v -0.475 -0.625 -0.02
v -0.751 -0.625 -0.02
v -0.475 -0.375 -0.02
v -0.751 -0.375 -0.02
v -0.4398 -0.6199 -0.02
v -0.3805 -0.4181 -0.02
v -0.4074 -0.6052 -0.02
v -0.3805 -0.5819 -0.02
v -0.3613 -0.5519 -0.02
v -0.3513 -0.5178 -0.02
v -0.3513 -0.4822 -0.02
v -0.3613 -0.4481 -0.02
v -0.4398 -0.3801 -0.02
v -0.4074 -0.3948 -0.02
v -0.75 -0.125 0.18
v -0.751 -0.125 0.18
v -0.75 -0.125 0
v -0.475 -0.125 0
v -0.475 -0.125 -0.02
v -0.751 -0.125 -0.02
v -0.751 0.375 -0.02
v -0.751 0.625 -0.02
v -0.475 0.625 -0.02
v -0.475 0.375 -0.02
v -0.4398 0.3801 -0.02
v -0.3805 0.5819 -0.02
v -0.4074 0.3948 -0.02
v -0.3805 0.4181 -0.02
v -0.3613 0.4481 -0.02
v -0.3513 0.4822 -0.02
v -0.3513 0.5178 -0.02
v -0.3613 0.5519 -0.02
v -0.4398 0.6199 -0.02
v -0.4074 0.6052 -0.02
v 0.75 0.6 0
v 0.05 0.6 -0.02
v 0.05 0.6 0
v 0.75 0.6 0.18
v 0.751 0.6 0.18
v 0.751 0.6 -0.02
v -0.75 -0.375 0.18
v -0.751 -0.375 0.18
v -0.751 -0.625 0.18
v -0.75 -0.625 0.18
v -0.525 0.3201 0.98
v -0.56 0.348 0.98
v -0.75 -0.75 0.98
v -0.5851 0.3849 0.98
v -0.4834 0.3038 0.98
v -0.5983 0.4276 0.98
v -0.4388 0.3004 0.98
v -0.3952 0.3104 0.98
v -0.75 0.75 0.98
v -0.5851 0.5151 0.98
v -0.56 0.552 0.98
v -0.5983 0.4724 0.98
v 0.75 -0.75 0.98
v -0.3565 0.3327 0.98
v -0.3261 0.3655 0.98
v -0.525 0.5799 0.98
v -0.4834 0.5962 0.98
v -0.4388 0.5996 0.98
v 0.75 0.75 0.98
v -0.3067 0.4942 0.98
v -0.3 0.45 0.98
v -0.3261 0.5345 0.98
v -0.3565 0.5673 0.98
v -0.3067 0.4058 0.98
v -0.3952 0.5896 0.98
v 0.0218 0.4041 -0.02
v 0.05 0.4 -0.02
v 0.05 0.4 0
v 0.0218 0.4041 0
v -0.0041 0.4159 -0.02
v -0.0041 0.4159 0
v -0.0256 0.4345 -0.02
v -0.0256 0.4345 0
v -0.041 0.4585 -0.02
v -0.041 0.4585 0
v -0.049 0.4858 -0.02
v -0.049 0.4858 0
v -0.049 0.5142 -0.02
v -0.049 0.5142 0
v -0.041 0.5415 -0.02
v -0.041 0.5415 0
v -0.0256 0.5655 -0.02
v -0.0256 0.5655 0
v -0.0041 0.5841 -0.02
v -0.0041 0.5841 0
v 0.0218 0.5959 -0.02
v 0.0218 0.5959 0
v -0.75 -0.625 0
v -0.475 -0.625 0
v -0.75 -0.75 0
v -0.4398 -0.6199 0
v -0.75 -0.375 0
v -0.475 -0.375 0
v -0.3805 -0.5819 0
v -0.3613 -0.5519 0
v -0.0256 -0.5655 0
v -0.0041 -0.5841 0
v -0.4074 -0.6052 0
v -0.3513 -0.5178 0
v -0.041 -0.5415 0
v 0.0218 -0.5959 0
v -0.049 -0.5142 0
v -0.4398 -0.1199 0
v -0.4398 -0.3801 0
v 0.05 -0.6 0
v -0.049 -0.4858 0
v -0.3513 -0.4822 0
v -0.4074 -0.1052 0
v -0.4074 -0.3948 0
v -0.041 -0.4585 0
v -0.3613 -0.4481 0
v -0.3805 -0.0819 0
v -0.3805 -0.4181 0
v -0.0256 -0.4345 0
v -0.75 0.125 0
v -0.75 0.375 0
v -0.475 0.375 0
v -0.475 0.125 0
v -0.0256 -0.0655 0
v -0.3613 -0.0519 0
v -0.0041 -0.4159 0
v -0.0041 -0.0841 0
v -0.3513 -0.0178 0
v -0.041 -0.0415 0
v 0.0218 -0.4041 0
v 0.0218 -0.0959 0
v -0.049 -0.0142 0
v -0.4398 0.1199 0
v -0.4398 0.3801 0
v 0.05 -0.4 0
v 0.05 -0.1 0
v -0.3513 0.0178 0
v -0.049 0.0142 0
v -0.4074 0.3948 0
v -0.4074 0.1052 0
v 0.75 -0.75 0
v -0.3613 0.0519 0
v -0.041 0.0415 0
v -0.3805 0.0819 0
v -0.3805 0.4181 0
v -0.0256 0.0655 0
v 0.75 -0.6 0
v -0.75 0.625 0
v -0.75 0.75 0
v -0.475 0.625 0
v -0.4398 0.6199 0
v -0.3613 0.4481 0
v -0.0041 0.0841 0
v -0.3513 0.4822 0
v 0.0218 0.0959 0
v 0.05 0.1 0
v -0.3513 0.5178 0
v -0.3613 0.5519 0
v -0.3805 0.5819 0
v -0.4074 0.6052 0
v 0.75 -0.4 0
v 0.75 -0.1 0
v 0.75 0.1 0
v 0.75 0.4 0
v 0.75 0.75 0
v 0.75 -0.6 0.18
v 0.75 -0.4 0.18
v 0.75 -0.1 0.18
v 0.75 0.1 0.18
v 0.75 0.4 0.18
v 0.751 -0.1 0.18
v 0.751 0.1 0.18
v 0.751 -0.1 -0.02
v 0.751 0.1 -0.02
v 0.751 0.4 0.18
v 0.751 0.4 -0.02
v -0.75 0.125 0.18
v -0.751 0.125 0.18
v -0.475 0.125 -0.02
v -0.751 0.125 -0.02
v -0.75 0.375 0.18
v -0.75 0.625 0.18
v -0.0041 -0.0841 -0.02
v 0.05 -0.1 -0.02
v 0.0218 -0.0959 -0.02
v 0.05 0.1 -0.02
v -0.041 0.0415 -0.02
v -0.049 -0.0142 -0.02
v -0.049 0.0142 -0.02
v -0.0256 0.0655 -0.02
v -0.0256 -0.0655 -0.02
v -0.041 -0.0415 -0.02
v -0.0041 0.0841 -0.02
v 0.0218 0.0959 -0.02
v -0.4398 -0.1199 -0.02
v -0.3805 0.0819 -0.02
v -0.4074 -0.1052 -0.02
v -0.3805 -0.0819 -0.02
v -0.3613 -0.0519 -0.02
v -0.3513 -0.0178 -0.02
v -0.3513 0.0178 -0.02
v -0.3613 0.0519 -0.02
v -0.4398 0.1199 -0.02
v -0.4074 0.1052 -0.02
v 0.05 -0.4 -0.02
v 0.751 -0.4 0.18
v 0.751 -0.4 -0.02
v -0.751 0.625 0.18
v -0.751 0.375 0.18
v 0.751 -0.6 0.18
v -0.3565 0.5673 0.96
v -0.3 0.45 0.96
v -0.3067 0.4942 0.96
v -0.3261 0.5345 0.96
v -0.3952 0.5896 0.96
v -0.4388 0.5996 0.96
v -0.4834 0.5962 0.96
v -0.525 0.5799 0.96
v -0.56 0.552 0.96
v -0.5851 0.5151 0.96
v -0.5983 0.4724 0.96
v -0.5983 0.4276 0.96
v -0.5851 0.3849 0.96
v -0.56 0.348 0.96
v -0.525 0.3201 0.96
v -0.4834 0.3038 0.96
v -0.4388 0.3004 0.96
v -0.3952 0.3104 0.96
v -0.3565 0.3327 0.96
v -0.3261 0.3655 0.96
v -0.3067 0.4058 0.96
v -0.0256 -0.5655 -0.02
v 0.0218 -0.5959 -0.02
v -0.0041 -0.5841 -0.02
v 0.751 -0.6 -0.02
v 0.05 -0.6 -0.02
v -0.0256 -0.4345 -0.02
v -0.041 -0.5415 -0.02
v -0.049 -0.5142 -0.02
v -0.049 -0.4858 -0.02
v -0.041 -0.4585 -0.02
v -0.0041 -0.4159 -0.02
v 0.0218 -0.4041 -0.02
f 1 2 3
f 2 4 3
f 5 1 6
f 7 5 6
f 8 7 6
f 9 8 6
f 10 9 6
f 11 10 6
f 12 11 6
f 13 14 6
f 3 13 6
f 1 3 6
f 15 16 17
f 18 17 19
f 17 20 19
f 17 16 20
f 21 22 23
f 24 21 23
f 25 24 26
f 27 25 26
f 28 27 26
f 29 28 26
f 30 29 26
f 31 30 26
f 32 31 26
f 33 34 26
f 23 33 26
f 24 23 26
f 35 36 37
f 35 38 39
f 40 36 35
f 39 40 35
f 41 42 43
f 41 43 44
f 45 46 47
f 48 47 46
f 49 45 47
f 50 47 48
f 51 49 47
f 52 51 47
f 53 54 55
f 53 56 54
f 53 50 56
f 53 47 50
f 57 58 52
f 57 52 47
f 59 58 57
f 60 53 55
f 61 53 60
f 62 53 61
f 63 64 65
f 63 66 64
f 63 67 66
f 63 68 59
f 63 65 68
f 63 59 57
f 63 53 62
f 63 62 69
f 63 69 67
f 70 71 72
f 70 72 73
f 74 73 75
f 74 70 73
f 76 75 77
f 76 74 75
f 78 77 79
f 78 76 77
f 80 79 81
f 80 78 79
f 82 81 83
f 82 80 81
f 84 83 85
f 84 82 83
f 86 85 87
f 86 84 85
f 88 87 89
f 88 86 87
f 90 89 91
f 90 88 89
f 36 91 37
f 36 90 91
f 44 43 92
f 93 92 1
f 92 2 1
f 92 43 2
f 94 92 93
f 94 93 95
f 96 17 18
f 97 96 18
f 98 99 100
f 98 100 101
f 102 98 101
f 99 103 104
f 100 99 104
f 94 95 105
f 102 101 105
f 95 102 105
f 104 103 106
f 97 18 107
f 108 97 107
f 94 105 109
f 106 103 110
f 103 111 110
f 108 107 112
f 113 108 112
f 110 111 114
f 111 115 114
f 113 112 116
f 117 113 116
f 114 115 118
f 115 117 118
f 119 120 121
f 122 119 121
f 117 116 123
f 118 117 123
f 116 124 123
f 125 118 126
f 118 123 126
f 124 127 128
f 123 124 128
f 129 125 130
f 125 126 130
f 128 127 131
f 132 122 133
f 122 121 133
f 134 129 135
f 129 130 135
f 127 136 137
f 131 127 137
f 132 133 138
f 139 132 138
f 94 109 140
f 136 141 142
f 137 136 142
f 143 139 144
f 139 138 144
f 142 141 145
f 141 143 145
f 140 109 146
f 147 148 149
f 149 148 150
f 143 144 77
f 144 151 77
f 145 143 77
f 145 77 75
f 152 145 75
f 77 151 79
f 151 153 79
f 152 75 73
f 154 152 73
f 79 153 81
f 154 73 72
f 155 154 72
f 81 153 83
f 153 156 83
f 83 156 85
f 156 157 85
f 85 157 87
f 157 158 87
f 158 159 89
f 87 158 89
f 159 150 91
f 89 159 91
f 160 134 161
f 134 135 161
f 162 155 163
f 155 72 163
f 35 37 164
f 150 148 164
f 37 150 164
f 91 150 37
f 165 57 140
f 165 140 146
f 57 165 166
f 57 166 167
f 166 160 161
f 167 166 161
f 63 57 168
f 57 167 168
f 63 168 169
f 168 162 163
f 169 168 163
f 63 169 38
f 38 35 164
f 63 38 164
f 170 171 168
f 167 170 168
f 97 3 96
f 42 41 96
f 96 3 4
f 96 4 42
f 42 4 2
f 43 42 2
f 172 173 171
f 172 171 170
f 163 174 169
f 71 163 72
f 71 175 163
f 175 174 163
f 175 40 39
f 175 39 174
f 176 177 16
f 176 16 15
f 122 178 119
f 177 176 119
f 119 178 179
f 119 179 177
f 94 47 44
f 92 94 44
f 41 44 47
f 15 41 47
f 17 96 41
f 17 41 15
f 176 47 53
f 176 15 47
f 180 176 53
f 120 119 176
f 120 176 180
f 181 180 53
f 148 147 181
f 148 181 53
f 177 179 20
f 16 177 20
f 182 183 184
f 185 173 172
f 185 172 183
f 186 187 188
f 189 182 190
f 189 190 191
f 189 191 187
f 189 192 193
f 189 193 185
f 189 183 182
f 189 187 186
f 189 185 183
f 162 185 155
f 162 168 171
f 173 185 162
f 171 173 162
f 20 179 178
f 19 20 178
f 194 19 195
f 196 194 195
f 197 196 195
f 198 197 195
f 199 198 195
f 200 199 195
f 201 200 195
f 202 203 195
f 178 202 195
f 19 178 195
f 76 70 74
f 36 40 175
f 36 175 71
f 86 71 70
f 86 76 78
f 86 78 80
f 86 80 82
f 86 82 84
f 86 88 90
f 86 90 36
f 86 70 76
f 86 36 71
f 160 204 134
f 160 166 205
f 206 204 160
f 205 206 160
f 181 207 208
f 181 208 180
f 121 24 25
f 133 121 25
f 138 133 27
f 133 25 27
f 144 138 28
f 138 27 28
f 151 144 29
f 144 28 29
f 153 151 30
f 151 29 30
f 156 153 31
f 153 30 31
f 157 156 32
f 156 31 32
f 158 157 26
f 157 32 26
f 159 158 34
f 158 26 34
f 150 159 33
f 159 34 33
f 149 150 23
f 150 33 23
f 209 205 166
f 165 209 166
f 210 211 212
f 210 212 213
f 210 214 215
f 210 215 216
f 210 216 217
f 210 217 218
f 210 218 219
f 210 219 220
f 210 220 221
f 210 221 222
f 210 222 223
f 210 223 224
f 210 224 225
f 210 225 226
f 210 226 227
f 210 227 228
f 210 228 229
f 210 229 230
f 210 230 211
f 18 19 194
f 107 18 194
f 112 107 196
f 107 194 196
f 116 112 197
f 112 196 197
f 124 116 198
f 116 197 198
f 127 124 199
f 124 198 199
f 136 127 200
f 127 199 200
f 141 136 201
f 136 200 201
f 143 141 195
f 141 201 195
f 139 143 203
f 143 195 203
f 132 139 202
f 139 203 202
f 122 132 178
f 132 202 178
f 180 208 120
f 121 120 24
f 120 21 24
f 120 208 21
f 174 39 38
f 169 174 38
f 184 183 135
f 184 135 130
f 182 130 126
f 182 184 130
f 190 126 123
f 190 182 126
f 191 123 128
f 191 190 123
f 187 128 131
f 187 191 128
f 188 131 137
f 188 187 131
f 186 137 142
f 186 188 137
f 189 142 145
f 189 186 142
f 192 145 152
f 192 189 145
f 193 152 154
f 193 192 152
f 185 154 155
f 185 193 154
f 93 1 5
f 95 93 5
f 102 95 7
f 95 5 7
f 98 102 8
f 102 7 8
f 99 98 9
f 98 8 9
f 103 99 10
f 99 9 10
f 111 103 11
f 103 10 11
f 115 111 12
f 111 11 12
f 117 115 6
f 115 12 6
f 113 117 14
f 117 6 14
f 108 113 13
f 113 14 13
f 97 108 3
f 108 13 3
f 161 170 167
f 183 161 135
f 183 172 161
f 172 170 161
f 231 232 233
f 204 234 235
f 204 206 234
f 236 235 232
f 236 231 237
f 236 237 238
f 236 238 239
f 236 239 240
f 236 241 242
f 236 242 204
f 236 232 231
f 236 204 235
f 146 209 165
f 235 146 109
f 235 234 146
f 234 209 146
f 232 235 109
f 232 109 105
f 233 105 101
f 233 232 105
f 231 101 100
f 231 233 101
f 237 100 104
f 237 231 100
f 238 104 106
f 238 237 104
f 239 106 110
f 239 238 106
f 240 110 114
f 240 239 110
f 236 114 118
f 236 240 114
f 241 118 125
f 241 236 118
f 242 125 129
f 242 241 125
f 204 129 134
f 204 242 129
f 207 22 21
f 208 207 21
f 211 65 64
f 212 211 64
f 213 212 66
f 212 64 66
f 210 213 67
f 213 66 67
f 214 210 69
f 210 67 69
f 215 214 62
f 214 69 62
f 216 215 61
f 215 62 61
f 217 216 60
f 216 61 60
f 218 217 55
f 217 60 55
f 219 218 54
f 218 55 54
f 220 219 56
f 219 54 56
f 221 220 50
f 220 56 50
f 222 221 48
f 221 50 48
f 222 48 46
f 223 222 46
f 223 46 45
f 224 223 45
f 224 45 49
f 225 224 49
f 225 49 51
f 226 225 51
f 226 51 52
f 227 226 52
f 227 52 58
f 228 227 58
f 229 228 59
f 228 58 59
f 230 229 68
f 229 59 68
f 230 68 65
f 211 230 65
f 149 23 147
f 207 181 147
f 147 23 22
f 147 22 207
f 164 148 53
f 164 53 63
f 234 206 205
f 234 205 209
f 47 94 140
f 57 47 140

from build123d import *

# Parameters (mm, degrees)
SKETCH1_W           = 1.5
SKETCH1_H           = 1.5
BOSS_EXTRUDE1_DEPTH = 0.98
SKETCH2_R           = 0.15
CUT_EXTRUDE1_DEPTH  = 0.02
BOSS_EXTRUDE2_DEPTH = 0.2


with BuildPart() as part:
    # Sketch1 → Boss-Extrude1 (new body)
    with BuildSketch(Plane.XY):
        Rectangle(SKETCH1_W, SKETCH1_H)
    extrude(amount=BOSS_EXTRUDE1_DEPTH)

    # Sketch2 → Cut-Extrude1 (cut)
    with BuildSketch(Plane.XY.offset(0.98)):
        with Locations((-0.45, 0.45)):
            Circle(SKETCH2_R)
    extrude(amount=-CUT_EXTRUDE1_DEPTH, mode=Mode.SUBTRACT)

    # Sketch3 → Boss-Extrude2 (add)
    with BuildSketch(Plane.XY.offset(-0.02)):
        with BuildLine():
            Line((-0.751, 0.625), (-0.751, 0.375))
            Line((-0.751, 0.375), (-0.475, 0.375))
            ThreePointArc((-0.475, 0.375), (-0.35, 0.5), (-0.475, 0.625))
            Line((-0.475, 0.625), (-0.751, 0.625))
        make_face()
        with BuildLine():
            Line((-0.751, -0.625), (-0.475, -0.625))
            ThreePointArc((-0.475, -0.625), (-0.35, -0.5), (-0.475, -0.375))
            Line((-0.475, -0.375), (-0.751, -0.375))
            Line((-0.751, -0.375), (-0.751, -0.625))
        make_face()
        with BuildLine():
            Line((-0.751, 0.125), (-0.751, -0.125))
            Line((-0.751, -0.125), (-0.475, -0.125))
            ThreePointArc((-0.475, -0.125), (-0.35, 0), (-0.475, 0.125))
            Line((-0.475, 0.125), (-0.751, 0.125))
        make_face()
        with BuildLine():
            Line((0.751, 0.6), (0.751, 0.4))
            Line((0.751, 0.4), (0.05, 0.4))
            ThreePointArc((0.05, 0.4), (-0.05, 0.5), (0.05, 0.6))
            Line((0.05, 0.6), (0.751, 0.6))
        make_face()
        with BuildLine():
            Line((0.751, -0.6), (0.05, -0.6))
            ThreePointArc((0.05, -0.6), (-0.05, -0.5), (0.05, -0.4))
            Line((0.05, -0.4), (0.751, -0.4))
            Line((0.751, -0.4), (0.751, -0.6))
        make_face()
        with BuildLine():
            Line((0.751, 0.1), (0.751, -0.1))
            Line((0.751, -0.1), (0.05, -0.1))
            ThreePointArc((0.05, -0.1), (-0.05, 0), (0.05, 0.1))
            Line((0.05, 0.1), (0.751, 0.1))
        make_face()
    extrude(amount=BOSS_EXTRUDE2_DEPTH)


solid = part.part
